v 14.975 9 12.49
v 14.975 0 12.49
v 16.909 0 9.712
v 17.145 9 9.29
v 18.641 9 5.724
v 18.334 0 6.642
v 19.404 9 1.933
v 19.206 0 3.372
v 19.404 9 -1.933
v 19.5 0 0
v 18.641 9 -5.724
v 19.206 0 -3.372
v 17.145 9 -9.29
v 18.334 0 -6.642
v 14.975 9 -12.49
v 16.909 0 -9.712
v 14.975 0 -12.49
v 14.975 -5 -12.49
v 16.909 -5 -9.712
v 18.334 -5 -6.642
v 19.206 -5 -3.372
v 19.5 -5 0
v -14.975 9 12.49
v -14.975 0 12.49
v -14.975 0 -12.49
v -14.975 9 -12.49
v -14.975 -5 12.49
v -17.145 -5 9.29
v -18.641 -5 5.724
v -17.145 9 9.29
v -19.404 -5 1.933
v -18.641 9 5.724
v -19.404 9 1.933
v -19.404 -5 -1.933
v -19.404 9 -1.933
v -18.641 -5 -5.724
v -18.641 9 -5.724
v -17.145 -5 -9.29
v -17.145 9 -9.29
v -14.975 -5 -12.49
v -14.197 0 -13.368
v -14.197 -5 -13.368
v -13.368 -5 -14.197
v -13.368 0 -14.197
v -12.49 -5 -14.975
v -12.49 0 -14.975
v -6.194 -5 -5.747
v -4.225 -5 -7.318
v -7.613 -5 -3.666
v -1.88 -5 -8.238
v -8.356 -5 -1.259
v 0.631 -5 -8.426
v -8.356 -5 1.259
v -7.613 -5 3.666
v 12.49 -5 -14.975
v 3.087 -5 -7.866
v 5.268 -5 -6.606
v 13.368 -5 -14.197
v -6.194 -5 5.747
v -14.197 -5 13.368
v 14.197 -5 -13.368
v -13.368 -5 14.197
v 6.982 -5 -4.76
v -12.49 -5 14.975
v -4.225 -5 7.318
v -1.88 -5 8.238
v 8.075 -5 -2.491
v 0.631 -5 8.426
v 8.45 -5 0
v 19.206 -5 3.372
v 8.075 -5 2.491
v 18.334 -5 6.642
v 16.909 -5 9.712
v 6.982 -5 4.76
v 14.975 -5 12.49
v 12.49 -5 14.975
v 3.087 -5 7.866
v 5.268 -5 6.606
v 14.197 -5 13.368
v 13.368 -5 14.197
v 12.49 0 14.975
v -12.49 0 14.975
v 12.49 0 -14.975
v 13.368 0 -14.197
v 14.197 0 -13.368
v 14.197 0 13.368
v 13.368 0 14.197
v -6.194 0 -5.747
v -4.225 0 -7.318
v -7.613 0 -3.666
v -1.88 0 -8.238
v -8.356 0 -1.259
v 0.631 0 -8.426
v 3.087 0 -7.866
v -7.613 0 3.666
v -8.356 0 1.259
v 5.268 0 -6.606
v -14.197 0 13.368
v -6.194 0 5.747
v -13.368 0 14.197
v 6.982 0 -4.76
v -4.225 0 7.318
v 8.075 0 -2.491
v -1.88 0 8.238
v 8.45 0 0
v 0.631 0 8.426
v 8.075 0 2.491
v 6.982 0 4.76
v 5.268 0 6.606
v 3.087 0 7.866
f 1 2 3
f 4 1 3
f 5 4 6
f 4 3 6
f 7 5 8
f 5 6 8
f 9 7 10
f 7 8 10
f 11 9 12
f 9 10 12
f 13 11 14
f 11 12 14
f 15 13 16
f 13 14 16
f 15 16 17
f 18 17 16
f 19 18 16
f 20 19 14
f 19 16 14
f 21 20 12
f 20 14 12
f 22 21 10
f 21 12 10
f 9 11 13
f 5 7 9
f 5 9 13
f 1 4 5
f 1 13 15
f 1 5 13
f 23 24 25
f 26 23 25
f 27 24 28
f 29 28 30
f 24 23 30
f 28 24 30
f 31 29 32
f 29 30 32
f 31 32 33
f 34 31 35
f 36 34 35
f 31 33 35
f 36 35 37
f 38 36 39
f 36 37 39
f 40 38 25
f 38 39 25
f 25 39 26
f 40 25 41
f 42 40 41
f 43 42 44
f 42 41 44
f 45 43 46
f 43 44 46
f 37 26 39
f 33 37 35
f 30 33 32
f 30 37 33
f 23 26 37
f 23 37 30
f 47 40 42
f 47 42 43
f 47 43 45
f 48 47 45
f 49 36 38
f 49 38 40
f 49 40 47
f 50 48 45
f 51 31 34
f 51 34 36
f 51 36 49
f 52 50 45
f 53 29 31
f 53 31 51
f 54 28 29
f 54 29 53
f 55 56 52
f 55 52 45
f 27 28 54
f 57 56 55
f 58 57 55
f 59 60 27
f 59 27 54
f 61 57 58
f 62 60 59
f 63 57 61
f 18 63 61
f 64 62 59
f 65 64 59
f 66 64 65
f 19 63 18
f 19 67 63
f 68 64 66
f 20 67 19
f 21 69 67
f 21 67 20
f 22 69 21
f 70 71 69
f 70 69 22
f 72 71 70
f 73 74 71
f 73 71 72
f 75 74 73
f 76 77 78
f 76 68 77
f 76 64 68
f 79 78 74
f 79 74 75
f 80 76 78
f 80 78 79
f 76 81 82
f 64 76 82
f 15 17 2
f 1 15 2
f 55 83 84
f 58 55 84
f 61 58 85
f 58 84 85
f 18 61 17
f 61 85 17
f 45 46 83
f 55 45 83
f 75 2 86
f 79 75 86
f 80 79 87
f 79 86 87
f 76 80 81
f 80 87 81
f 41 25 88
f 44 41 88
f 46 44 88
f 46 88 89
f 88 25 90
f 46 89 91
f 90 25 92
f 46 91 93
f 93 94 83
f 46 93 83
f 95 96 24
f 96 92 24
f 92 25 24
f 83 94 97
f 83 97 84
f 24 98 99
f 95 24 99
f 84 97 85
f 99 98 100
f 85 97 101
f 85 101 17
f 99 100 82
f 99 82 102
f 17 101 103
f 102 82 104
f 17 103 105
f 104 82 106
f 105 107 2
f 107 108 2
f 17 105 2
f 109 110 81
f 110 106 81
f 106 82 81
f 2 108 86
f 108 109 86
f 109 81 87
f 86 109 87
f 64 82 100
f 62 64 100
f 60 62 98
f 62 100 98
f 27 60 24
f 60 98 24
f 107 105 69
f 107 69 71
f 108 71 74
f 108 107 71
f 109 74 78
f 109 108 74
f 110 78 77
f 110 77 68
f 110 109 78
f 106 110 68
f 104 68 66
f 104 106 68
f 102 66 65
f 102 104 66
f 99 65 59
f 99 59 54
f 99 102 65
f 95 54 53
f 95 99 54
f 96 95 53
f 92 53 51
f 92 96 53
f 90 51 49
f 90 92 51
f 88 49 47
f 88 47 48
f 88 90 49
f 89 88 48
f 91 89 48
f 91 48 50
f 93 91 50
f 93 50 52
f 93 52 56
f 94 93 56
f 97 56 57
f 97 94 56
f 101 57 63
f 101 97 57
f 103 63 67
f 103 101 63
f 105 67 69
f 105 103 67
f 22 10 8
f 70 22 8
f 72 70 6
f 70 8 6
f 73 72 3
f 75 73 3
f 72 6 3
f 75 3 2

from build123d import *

# Parameters (mm, degrees)
F0_R     = 8.45
F1_DEPTH = 5
F3_DEPTH = 5
F5_DEPTH = 9


# Not quite as in the source:
# - after a boolean that leaves OpenCascade's solid faulty, fix() repairs it
# - a feature names something its author has since deleted; it is built from what else it names


with BuildPart() as f1:
    # F0 (on Front) → F1 (new body)
    with BuildSketch(Plane.XZ):
        with BuildLine():
            ThreePointArc((14.975, 12.4899709767), (13.7885822331, 13.7885822331), (12.4899709767, 14.975))
            Line((12.4899709767, 14.975), (-12.4899709767, 14.975))
            ThreePointArc((-12.4899709767, 14.975), (-13.7885822331, 13.7885822331), (-14.975, 12.4899709767))
            Line((-14.975, 12.4899709767), (-14.975, -12.4899709767))
            ThreePointArc((-14.975, -12.4899709767), (-13.7885822331, -13.7885822331), (-12.4899709767, -14.975))
            Line((-12.4899709767, -14.975), (12.4899709767, -14.975))
            ThreePointArc((12.4899709767, -14.975), (13.7885822331, -13.7885822331), (14.975, -12.4899709767))
            Line((14.975, -12.4899709767), (14.975, 12.4899709767))
        make_face()
        Circle(F0_R, mode=Mode.SUBTRACT)
        with BuildLine():
            Line((-12.4899709767, 14.975), (12.4899709767, 14.975))
            ThreePointArc((12.4899709767, 14.975), (0, 19.5), (-12.4899709767, 14.975))
        make_face()
        with BuildLine():
            ThreePointArc((-12.4899709767, -14.975), (0, -19.5), (12.4899709767, -14.975))
            Line((12.4899709767, -14.975), (-12.4899709767, -14.975))
        make_face()
        with BuildLine():
            ThreePointArc((19.5, 0), (18.3338825675, 6.6421946674), (14.975, 12.4899709767))
            Line((14.975, 12.4899709767), (14.975, -12.4899709767))
            ThreePointArc((14.975, -12.4899709767), (18.3338825675, -6.6421946674), (19.5, 0))
        make_face()
        with BuildLine():
            Line((-14.975, -12.4899709767), (-14.975, 12.4899709767))
            ThreePointArc((-14.975, 12.4899709767), (-19.5, 0), (-14.975, -12.4899709767))
        make_face()
    extrude(amount=F1_DEPTH)

    # F2 (on face) → F3 (cut, through all)
    with BuildSketch(Plane(origin=(0, 0, 0), x_dir=(-1, 0, 0), z_dir=(0, 1, 0))):
        with BuildLine():
            ThreePointArc((12.4899709767, 14.975), (0, 19.5), (-12.4899709767, 14.975))
            Line((-12.4899709767, 14.975), (12.4899709767, 14.975))
        make_face()
        with BuildLine():
            Line((12.4899709767, -14.975), (-12.4899709767, -14.975))
            ThreePointArc((-12.4899709767, -14.975), (0, -19.5), (12.4899709767, -14.975))
        make_face()
    extrude(amount=-F3_DEPTH, mode=Mode.SUBTRACT)

    # F4 (on face) → F5 (join)
    with BuildSketch(Plane(origin=(0, 0, 0), x_dir=(-1, 0, 0), z_dir=(0, 1, 0))):
        with BuildLine():
            Line((-14.975, -12.4899709767), (-14.975, 12.4899709767))
            ThreePointArc((-14.975, 12.4899709767), (-19.5, 0), (-14.975, -12.4899709767))
        make_face()
        with BuildLine():
            ThreePointArc((14.975, -12.4899709767), (19.5, 0), (14.975, 12.4899709767))
            Line((14.975, 12.4899709767), (14.975, -12.4899709767))
        make_face()
    extrude(amount=F5_DEPTH)

    add(f1.part.fix(), mode=Mode.REPLACE)


solid = f1.part
